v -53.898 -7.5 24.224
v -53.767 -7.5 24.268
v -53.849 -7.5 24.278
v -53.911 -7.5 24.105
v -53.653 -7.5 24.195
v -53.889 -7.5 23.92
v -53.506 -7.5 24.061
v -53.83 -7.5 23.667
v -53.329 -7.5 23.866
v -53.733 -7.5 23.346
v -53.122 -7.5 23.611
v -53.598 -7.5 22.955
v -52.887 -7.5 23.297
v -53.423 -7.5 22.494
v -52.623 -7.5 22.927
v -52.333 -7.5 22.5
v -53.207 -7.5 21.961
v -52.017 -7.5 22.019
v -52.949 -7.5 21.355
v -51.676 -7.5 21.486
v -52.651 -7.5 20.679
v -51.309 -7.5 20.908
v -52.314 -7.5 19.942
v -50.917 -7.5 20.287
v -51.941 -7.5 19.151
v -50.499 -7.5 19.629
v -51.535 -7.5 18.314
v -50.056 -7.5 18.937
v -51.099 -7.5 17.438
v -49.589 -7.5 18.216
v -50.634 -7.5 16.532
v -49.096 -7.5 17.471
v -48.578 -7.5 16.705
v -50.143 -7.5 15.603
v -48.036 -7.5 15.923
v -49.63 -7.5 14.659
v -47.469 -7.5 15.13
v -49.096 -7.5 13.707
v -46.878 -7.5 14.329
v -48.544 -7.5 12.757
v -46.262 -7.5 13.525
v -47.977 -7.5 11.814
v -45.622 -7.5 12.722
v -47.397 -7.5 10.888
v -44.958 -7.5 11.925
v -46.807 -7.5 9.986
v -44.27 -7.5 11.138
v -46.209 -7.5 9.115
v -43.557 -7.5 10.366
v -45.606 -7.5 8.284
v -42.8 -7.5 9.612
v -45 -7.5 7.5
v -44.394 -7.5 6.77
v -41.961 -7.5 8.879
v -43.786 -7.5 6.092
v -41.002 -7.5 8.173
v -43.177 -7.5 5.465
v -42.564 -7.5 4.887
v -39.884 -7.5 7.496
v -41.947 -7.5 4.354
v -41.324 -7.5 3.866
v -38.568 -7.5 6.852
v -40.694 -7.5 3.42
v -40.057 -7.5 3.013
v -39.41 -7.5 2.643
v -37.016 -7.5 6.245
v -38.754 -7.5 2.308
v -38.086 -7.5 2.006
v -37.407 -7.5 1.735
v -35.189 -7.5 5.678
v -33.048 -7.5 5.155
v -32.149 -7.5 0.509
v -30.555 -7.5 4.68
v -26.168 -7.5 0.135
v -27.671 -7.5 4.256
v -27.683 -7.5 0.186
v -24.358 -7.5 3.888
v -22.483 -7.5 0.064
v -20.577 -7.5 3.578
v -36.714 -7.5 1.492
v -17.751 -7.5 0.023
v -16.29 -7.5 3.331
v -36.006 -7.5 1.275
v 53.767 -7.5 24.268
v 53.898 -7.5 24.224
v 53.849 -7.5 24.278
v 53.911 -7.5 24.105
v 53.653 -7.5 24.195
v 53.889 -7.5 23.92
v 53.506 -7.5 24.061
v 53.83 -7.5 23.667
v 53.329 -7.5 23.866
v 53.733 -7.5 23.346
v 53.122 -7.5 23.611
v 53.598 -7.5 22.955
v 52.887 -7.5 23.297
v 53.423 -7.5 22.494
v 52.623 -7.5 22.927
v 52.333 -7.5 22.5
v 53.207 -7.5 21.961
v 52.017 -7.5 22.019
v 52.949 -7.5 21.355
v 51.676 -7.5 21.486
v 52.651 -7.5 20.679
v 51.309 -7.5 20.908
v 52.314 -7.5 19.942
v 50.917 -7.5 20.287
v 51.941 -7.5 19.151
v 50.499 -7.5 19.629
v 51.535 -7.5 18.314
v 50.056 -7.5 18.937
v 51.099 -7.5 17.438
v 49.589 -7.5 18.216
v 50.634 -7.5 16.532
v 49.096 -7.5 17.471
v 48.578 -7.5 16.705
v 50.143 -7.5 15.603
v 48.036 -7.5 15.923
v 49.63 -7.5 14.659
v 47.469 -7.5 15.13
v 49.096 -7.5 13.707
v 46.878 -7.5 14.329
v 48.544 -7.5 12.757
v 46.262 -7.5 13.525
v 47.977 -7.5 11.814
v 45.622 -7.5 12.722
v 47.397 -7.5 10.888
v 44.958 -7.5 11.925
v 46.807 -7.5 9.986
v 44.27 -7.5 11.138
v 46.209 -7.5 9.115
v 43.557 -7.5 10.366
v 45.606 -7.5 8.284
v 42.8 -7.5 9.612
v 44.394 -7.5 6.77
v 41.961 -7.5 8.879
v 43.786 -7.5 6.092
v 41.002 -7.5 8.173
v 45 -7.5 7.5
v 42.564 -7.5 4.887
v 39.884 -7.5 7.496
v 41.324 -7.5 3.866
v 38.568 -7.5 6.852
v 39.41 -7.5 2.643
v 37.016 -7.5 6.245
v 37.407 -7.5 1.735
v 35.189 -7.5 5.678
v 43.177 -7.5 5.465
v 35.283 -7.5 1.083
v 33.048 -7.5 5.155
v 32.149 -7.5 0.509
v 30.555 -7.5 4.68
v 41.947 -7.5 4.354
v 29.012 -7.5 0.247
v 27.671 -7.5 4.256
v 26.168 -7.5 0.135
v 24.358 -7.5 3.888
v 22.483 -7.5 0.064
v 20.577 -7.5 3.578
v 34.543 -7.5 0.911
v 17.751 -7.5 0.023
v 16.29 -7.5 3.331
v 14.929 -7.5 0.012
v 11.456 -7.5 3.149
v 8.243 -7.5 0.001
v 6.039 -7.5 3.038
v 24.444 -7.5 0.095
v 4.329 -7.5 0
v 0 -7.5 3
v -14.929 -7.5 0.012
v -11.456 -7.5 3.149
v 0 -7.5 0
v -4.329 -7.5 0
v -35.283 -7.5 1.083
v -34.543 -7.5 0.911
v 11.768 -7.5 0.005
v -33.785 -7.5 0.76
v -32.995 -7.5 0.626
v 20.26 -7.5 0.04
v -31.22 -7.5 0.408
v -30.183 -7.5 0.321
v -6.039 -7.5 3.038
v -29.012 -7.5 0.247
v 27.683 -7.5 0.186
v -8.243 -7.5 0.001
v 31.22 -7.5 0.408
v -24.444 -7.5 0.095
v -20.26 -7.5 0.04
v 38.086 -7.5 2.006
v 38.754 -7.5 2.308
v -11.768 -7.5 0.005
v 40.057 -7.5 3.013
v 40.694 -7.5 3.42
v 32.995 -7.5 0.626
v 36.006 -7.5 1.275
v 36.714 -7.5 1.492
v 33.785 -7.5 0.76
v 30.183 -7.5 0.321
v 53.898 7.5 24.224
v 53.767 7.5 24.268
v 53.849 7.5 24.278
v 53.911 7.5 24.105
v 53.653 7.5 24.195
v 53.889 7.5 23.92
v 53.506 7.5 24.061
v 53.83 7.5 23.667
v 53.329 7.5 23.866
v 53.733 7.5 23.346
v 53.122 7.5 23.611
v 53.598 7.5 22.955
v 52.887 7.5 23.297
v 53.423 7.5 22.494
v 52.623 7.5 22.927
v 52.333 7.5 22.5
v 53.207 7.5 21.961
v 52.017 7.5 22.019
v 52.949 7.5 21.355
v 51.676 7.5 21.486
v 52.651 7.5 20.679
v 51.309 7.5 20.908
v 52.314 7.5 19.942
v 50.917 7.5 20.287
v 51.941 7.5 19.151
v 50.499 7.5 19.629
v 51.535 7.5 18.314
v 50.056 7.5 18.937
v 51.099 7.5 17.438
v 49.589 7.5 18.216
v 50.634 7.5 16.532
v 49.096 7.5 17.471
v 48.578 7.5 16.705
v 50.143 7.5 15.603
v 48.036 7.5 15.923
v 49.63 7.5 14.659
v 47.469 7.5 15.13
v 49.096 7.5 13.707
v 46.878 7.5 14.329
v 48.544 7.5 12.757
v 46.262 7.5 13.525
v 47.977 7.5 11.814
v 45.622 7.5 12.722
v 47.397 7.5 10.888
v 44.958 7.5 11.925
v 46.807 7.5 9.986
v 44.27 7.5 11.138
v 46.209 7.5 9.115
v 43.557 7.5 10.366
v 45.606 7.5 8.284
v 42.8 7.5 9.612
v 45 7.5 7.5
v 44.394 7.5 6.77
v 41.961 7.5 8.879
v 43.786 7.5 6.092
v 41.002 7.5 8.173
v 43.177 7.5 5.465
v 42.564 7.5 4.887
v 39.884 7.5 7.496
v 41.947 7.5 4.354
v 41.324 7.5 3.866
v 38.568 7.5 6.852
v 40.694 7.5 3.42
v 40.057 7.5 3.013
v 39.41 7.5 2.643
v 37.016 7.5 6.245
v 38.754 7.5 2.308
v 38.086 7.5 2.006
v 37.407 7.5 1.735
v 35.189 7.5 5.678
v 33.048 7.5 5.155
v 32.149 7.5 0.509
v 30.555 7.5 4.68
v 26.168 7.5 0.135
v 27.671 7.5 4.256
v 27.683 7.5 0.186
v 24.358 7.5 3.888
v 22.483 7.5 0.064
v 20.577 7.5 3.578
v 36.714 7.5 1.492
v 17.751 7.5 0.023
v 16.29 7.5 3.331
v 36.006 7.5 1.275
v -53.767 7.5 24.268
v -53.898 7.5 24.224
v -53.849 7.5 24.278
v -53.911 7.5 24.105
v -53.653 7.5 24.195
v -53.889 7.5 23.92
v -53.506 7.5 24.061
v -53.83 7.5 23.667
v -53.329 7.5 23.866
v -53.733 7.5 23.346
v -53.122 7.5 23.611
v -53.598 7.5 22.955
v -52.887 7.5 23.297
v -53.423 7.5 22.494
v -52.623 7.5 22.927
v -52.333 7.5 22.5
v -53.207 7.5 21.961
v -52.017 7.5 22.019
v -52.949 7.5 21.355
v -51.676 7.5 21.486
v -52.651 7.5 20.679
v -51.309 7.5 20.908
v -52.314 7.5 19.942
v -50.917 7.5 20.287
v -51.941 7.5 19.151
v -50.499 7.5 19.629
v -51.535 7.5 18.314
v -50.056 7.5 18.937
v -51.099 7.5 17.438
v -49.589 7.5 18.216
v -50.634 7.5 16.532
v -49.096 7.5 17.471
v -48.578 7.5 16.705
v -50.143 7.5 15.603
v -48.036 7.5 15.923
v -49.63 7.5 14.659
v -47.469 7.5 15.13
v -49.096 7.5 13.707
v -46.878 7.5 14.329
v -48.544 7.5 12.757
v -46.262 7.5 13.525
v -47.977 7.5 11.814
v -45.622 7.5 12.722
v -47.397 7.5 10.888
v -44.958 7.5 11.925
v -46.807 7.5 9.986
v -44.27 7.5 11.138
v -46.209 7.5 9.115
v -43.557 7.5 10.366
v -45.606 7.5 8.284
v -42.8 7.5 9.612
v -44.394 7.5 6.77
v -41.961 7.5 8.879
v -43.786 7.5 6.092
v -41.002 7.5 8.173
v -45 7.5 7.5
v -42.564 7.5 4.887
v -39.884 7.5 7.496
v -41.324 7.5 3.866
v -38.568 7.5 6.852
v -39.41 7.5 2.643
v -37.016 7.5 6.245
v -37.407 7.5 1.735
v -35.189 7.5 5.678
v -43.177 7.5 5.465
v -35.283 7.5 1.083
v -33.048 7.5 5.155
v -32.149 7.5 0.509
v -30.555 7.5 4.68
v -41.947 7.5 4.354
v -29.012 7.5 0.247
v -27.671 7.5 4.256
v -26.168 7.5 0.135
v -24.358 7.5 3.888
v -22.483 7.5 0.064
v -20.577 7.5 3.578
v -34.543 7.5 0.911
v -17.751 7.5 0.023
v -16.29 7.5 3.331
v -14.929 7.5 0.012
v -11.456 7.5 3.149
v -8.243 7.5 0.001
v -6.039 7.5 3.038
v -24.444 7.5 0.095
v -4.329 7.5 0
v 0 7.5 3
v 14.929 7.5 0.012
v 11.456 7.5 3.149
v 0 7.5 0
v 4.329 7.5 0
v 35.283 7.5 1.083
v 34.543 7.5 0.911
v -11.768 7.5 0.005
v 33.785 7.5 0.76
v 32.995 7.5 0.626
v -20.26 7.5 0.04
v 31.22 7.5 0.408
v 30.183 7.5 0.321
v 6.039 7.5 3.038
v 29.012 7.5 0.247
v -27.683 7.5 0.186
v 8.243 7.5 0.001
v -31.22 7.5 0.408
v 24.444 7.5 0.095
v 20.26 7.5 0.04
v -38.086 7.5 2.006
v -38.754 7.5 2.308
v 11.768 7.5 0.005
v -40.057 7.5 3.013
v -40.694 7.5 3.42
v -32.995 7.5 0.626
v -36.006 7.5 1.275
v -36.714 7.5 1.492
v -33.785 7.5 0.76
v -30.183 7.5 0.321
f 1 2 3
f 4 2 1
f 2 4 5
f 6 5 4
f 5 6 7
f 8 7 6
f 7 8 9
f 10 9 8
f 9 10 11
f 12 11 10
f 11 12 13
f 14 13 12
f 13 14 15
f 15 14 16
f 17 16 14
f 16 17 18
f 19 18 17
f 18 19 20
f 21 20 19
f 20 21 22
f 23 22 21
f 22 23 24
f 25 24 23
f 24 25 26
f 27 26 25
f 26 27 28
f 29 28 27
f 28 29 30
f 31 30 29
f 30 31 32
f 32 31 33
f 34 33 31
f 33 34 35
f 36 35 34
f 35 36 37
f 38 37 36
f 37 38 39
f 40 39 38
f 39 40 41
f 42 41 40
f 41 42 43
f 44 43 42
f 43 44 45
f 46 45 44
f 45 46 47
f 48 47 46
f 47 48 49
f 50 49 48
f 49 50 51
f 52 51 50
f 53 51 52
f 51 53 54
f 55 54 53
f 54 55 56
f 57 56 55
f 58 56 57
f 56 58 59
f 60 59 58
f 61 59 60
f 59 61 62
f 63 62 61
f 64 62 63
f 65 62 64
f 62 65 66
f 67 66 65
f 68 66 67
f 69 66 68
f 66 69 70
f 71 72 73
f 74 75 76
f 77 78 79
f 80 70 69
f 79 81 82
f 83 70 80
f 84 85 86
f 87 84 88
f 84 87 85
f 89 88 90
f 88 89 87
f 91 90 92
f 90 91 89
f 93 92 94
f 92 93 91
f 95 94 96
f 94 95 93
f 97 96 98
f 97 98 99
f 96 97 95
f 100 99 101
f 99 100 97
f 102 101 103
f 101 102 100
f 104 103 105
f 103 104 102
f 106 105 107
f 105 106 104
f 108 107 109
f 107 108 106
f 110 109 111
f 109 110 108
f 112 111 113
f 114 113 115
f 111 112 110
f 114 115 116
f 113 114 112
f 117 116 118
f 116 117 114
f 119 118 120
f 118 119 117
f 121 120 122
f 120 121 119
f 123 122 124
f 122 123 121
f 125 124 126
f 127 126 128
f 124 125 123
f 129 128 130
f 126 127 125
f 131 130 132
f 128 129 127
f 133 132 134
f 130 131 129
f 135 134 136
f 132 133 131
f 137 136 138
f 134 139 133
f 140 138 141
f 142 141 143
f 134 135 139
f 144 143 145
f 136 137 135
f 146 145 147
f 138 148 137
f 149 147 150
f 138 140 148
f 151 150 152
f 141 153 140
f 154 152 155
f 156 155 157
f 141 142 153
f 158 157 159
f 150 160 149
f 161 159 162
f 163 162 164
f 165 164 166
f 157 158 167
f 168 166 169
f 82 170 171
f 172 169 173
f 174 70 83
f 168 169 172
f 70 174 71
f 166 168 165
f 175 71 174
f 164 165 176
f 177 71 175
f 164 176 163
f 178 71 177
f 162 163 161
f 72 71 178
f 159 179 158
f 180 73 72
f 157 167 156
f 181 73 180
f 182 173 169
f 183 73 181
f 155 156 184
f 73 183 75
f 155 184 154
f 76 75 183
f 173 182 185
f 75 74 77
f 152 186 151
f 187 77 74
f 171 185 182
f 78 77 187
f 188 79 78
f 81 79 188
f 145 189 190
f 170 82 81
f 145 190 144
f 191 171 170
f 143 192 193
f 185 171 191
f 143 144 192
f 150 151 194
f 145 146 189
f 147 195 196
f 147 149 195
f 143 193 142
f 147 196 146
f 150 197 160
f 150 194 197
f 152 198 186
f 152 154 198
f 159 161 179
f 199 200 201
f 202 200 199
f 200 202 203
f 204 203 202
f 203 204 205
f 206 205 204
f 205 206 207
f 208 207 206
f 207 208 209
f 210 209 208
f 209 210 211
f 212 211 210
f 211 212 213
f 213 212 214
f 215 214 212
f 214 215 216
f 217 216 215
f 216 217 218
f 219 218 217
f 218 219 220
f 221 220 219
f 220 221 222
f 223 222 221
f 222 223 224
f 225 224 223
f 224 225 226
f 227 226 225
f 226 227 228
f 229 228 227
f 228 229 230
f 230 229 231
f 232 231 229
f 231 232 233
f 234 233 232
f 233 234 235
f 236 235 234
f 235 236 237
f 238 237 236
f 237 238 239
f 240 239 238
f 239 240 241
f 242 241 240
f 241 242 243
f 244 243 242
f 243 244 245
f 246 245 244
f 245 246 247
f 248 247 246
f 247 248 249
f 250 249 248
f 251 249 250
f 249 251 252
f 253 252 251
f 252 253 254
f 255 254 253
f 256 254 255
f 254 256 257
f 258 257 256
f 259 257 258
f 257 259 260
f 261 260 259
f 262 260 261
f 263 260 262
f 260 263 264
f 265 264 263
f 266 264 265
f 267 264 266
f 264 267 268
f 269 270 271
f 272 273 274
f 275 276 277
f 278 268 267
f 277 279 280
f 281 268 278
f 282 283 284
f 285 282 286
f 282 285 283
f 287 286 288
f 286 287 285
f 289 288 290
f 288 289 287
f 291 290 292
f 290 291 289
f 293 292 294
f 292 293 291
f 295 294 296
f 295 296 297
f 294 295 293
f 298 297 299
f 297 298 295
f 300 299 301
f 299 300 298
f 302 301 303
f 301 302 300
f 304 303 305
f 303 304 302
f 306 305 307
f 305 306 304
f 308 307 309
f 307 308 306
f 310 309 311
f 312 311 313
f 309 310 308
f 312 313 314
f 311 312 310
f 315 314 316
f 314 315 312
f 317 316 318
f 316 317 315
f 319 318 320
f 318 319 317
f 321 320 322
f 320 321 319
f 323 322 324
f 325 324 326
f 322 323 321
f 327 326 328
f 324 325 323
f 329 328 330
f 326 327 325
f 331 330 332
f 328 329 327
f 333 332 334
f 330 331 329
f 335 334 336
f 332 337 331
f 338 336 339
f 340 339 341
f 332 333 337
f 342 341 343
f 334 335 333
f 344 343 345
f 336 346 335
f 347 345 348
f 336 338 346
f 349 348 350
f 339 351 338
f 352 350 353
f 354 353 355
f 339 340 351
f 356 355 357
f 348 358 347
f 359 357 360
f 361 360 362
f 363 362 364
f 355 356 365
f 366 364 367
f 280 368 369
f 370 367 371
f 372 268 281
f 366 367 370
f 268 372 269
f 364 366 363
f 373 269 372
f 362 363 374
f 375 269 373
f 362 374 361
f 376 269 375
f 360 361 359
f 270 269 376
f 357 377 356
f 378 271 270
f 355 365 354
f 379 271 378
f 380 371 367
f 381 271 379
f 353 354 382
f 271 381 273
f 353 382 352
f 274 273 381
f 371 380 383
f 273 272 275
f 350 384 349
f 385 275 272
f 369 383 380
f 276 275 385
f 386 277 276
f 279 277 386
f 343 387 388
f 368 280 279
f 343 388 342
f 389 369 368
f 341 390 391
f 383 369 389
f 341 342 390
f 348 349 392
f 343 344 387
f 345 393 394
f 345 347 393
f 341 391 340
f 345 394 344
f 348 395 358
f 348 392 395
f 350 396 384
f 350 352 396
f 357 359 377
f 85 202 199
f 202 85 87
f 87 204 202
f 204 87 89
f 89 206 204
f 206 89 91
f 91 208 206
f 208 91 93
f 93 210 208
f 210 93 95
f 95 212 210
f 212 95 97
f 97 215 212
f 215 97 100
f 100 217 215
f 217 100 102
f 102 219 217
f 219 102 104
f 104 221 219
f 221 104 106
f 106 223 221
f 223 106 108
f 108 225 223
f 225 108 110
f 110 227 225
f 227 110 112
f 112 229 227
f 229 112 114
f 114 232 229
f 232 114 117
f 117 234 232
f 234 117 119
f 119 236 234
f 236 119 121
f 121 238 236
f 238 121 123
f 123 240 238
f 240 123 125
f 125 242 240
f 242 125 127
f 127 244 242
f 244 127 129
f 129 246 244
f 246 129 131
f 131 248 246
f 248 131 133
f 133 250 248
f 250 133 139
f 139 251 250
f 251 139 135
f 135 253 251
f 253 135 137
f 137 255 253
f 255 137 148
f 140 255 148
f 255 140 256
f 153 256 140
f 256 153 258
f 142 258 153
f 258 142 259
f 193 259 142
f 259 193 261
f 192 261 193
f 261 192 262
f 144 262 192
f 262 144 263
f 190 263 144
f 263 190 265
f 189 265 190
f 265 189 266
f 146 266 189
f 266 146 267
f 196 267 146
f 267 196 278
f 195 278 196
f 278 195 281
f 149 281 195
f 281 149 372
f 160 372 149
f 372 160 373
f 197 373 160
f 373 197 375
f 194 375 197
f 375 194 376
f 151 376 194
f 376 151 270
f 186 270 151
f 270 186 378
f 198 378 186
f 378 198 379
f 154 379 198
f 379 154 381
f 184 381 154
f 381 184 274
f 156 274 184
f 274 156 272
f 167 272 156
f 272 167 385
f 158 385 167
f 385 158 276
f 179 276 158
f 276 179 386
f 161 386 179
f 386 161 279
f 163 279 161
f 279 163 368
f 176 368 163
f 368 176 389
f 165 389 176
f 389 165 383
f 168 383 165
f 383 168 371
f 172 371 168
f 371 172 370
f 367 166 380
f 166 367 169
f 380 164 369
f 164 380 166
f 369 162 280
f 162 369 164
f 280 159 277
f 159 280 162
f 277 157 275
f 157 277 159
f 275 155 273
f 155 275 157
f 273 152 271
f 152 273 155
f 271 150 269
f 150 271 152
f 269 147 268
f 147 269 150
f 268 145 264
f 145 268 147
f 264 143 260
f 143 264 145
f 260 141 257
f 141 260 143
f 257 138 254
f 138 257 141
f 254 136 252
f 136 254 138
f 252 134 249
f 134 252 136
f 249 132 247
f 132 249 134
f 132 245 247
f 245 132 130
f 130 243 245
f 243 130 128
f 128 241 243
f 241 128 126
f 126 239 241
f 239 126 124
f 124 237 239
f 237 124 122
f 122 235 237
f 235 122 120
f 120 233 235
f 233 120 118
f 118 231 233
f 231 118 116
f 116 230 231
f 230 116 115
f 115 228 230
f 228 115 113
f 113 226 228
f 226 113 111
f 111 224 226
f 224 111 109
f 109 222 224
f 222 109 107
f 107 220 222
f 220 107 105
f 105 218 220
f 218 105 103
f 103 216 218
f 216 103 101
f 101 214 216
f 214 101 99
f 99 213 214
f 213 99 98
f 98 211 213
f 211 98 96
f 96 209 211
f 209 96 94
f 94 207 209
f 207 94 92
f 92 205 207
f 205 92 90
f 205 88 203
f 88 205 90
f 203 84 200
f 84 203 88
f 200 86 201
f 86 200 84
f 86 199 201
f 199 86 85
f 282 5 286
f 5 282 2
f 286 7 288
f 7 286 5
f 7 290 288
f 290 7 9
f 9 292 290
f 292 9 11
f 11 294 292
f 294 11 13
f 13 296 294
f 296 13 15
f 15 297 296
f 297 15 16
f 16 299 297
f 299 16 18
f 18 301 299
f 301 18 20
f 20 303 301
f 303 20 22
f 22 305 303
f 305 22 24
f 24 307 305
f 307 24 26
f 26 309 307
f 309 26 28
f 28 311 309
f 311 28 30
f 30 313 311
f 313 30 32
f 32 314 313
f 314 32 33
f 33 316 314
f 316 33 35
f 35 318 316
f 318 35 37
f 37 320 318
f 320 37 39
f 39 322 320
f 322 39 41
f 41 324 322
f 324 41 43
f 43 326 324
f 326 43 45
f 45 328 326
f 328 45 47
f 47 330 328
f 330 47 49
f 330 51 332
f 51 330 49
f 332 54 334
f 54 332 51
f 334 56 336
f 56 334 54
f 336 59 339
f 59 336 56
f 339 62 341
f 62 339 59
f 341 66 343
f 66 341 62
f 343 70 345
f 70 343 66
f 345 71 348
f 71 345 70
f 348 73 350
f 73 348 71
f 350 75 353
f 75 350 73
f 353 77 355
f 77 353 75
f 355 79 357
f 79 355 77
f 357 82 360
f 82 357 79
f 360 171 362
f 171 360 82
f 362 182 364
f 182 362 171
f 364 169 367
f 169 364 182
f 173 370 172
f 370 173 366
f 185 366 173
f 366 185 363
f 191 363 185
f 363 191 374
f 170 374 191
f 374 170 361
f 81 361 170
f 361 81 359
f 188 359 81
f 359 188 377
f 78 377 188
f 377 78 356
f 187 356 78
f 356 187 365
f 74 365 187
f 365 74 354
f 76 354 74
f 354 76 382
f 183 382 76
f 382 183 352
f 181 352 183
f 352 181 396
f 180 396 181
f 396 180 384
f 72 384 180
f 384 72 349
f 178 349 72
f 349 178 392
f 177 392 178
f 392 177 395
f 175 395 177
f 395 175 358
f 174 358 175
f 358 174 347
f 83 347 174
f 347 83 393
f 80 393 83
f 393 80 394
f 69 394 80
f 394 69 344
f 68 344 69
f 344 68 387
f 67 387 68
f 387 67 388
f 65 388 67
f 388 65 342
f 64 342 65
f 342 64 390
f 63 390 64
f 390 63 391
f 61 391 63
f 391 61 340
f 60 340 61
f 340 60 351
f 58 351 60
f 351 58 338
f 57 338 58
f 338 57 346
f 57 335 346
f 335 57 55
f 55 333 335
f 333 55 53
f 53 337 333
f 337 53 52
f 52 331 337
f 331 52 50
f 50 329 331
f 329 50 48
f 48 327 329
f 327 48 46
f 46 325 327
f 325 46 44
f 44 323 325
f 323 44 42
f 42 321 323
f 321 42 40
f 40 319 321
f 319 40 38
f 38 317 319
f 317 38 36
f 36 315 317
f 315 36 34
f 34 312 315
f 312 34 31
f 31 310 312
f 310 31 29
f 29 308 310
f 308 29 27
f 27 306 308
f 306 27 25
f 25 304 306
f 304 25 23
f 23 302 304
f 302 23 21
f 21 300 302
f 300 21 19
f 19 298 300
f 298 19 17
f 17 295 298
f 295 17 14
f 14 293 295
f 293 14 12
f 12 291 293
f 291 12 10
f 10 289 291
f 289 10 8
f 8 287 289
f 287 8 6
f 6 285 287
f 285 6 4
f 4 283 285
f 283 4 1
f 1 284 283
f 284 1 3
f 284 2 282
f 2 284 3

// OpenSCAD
module LandingGear(){
 rotate([-90,0,0])
 union() {
  linear_extrude(height = 15, center = true, convexity = 10, twist = 0)polygon( points=[[0.0, 0.0], [4.329335596553227, -0.00018550982738310565], [8.243500199423064, -0.0014840786190648452], [11.768094164788378, -0.0050087653393438535], [14.928717848828041, -0.011872628952518761], [17.750971607720924, -0.023188728422888216], [20.26045579764588, -0.04007012271475083], [22.482770774781798, -0.06362987079240526], [24.44351689530753, -0.09498103162015009], [26.16829451540195, -0.135236664162284], [27.68270399124394, -0.18550982738310573], [29.01234567901235, -0.24691358024691368], [30.182819934886055, -0.3205609817180066], [31.21972711504392, -0.4075650907606832], [32.14866757566482, -0.5090389663392421], [32.99524167292762, -0.6260956674179816], [33.78504976301119, -0.7598482529612007], [34.54318205006911, -0.9114329706616213], [35.28299524167293, -1.0825194089656902], [36.00611254881227, -1.275310497073583], [36.71364703045144, -1.4920323529138964], [37.40671174555471, -1.7349110944152264], [38.086419753086425, -2.0061728395061733], [38.75388411201082, -2.3080437061153316], [39.410217881292255, -2.6427498121713], [40.056534119895, -3.012517275602676], [40.693945886783354, -3.4195722143380554], [41.32356624092161, -3.866140746306037], [41.946508241274074, -4.354448989435217], [42.563884946805054, -4.886723061654191], [43.17680941647883, -5.465189080891561], [43.78639470925971, -6.09207316507592], [44.39375388411201, -6.76960143213587], [44.99999999999999, -7.500000000000002], [45.60563393345762, -8.283825398150471], [46.20870783129737, -9.114955802283632], [46.80666165790132, -9.985599799649389], [47.39693537765162, -10.88796597749766], [47.976968954930385, -11.814262923078353], [48.544202354119705, -12.756699223641373], [49.096075539601706, -13.70748346643664], [49.63002847575851, -14.658824238714052], [50.1435011269722, -15.602930127723516], [50.63393345762492, -16.532009720714957], [51.098765432098766, -17.438271604938276], [51.53543701477586, -18.31392436764338], [51.94138817003831, -19.15117659608018], [52.314058862268226, -19.94223687749859], [52.650889055847735, -20.679313799148513], [52.94931871515893, -21.354615948279864], [53.20686200851492, -21.96053742196994], [53.42273979464063, -22.49373904332583], [53.59787962267301, -22.955148361484454], [53.73328324567994, -23.34587843541012], [53.829952416729284, -23.66704232406712], [53.88888888888889, -23.919753086419753], [53.91109441522665, -24.10512378143233], [53.89757074881042, -24.224267468069122], [53.84931964270809, -24.278297205294457], [53.76734284998749, -24.26832605207261], [53.65264212371651, -24.1954670673679], [53.50621921696301, -24.060833310144602], [53.329075882794896, -23.865537839367043], [53.122213874279986, -23.610693713999495], [52.88663494448618, -23.297413993006277], [52.62334084648135, -22.92681173535168], [52.333333333333336, -22.499999999999996], [52.01746575024812, -22.01862982441495], [51.675997810984036, -21.48650416005787], [51.30904082143751, -20.907963936889555], [50.91670608750499, -20.287350084870738], [50.49910491508288, -19.62900353396221], [50.056348610067616, -18.937265214124718], [49.58854847835564, -18.216476055319024], [49.095815825843374, -17.470976987505907], [48.57826195842725, -16.70510894064612], [48.0359981820037, -15.923212844700444], [47.46913580246914, -15.129629629629628], [46.87778612572001, -14.328700225394433], [46.26206045765274, -13.52476556195564], [45.62207010416376, -12.722166569273996], [44.95792637114951, -11.925244177310288], [44.26974056450641, -11.138339316025258], [43.55681702238176, -10.36577900214263], [42.799899824693206, -9.61157024793388], [41.96117279312871, -8.879400061218234], [41.00201278162709, -8.172941536577895], [39.8837966441272, -7.495867768595031], [38.567901234567884, -6.851851851851846], [37.01570340688795, -6.244566880930509], [35.188580015026275, -5.677685950413218], [33.04790791292167, -5.154882154882152], [30.555063954512953, -4.679828588919492], [27.671424993739016, -4.256198347107436], [24.358367884538637, -3.887664524028156], [20.57726948085071, -3.5779002142638485], [16.289506636614057, -3.330578512396693], [11.456456205767449, -3.149372513008875], [6.039495042249834, -3.0379553106825834], [0.0, -3.0], ] );
  linear_extrude(height = 15, center = true, convexity = 10, twist = 0)mirror([1,0,0])polygon( points=[[0.0, 0.0], [4.329335596553227, -0.00018550982738310565], [8.243500199423064, -0.0014840786190648452], [11.768094164788378, -0.0050087653393438535], [14.928717848828041, -0.011872628952518761], [17.750971607720924, -0.023188728422888216], [20.26045579764588, -0.04007012271475083], [22.482770774781798, -0.06362987079240526], [24.44351689530753, -0.09498103162015009], [26.16829451540195, -0.135236664162284], [27.68270399124394, -0.18550982738310573], [29.01234567901235, -0.24691358024691368], [30.182819934886055, -0.3205609817180066], [31.21972711504392, -0.4075650907606832], [32.14866757566482, -0.5090389663392421], [32.99524167292762, -0.6260956674179816], [33.78504976301119, -0.7598482529612007], [34.54318205006911, -0.9114329706616213], [35.28299524167293, -1.0825194089656902], [36.00611254881227, -1.275310497073583], [36.71364703045144, -1.4920323529138964], [37.40671174555471, -1.7349110944152264], [38.086419753086425, -2.0061728395061733], [38.75388411201082, -2.3080437061153316], [39.410217881292255, -2.6427498121713], [40.056534119895, -3.012517275602676], [40.693945886783354, -3.4195722143380554], [41.32356624092161, -3.866140746306037], [41.946508241274074, -4.354448989435217], [42.563884946805054, -4.886723061654191], [43.17680941647883, -5.465189080891561], [43.78639470925971, -6.09207316507592], [44.39375388411201, -6.76960143213587], [44.99999999999999, -7.500000000000002], [45.60563393345762, -8.283825398150471], [46.20870783129737, -9.114955802283632], [46.80666165790132, -9.985599799649389], [47.39693537765162, -10.88796597749766], [47.976968954930385, -11.814262923078353], [48.544202354119705, -12.756699223641373], [49.096075539601706, -13.70748346643664], [49.63002847575851, -14.658824238714052], [50.1435011269722, -15.602930127723516], [50.63393345762492, -16.532009720714957], [51.098765432098766, -17.438271604938276], [51.53543701477586, -18.31392436764338], [51.94138817003831, -19.15117659608018], [52.314058862268226, -19.94223687749859], [52.650889055847735, -20.679313799148513], [52.94931871515893, -21.354615948279864], [53.20686200851492, -21.96053742196994], [53.42273979464063, -22.49373904332583], [53.59787962267301, -22.955148361484454], [53.73328324567994, -23.34587843541012], [53.829952416729284, -23.66704232406712], [53.88888888888889, -23.919753086419753], [53.91109441522665, -24.10512378143233], [53.89757074881042, -24.224267468069122], [53.84931964270809, -24.278297205294457], [53.76734284998749, -24.26832605207261], [53.65264212371651, -24.1954670673679], [53.50621921696301, -24.060833310144602], [53.329075882794896, -23.865537839367043], [53.122213874279986, -23.610693713999495], [52.88663494448618, -23.297413993006277], [52.62334084648135, -22.92681173535168], [52.333333333333336, -22.499999999999996], [52.01746575024812, -22.01862982441495], [51.675997810984036, -21.48650416005787], [51.30904082143751, -20.907963936889555], [50.91670608750499, -20.287350084870738], [50.49910491508288, -19.62900353396221], [50.056348610067616, -18.937265214124718], [49.58854847835564, -18.216476055319024], [49.095815825843374, -17.470976987505907], [48.57826195842725, -16.70510894064612], [48.0359981820037, -15.923212844700444], [47.46913580246914, -15.129629629629628], [46.87778612572001, -14.328700225394433], [46.26206045765274, -13.52476556195564], [45.62207010416376, -12.722166569273996], [44.95792637114951, -11.925244177310288], [44.26974056450641, -11.138339316025258], [43.55681702238176, -10.36577900214263], [42.799899824693206, -9.61157024793388], [41.96117279312871, -8.879400061218234], [41.00201278162709, -8.172941536577895], [39.8837966441272, -7.495867768595031], [38.567901234567884, -6.851851851851846], [37.01570340688795, -6.244566880930509], [35.188580015026275, -5.677685950413218], [33.04790791292167, -5.154882154882152], [30.555063954512953, -4.679828588919492], [27.671424993739016, -4.256198347107436], [24.358367884538637, -3.887664524028156], [20.57726948085071, -3.5779002142638485], [16.289506636614057, -3.330578512396693], [11.456456205767449, -3.149372513008875], [6.039495042249834, -3.0379553106825834], [0.0, -3.0], ] );
};};

LandingGear();
